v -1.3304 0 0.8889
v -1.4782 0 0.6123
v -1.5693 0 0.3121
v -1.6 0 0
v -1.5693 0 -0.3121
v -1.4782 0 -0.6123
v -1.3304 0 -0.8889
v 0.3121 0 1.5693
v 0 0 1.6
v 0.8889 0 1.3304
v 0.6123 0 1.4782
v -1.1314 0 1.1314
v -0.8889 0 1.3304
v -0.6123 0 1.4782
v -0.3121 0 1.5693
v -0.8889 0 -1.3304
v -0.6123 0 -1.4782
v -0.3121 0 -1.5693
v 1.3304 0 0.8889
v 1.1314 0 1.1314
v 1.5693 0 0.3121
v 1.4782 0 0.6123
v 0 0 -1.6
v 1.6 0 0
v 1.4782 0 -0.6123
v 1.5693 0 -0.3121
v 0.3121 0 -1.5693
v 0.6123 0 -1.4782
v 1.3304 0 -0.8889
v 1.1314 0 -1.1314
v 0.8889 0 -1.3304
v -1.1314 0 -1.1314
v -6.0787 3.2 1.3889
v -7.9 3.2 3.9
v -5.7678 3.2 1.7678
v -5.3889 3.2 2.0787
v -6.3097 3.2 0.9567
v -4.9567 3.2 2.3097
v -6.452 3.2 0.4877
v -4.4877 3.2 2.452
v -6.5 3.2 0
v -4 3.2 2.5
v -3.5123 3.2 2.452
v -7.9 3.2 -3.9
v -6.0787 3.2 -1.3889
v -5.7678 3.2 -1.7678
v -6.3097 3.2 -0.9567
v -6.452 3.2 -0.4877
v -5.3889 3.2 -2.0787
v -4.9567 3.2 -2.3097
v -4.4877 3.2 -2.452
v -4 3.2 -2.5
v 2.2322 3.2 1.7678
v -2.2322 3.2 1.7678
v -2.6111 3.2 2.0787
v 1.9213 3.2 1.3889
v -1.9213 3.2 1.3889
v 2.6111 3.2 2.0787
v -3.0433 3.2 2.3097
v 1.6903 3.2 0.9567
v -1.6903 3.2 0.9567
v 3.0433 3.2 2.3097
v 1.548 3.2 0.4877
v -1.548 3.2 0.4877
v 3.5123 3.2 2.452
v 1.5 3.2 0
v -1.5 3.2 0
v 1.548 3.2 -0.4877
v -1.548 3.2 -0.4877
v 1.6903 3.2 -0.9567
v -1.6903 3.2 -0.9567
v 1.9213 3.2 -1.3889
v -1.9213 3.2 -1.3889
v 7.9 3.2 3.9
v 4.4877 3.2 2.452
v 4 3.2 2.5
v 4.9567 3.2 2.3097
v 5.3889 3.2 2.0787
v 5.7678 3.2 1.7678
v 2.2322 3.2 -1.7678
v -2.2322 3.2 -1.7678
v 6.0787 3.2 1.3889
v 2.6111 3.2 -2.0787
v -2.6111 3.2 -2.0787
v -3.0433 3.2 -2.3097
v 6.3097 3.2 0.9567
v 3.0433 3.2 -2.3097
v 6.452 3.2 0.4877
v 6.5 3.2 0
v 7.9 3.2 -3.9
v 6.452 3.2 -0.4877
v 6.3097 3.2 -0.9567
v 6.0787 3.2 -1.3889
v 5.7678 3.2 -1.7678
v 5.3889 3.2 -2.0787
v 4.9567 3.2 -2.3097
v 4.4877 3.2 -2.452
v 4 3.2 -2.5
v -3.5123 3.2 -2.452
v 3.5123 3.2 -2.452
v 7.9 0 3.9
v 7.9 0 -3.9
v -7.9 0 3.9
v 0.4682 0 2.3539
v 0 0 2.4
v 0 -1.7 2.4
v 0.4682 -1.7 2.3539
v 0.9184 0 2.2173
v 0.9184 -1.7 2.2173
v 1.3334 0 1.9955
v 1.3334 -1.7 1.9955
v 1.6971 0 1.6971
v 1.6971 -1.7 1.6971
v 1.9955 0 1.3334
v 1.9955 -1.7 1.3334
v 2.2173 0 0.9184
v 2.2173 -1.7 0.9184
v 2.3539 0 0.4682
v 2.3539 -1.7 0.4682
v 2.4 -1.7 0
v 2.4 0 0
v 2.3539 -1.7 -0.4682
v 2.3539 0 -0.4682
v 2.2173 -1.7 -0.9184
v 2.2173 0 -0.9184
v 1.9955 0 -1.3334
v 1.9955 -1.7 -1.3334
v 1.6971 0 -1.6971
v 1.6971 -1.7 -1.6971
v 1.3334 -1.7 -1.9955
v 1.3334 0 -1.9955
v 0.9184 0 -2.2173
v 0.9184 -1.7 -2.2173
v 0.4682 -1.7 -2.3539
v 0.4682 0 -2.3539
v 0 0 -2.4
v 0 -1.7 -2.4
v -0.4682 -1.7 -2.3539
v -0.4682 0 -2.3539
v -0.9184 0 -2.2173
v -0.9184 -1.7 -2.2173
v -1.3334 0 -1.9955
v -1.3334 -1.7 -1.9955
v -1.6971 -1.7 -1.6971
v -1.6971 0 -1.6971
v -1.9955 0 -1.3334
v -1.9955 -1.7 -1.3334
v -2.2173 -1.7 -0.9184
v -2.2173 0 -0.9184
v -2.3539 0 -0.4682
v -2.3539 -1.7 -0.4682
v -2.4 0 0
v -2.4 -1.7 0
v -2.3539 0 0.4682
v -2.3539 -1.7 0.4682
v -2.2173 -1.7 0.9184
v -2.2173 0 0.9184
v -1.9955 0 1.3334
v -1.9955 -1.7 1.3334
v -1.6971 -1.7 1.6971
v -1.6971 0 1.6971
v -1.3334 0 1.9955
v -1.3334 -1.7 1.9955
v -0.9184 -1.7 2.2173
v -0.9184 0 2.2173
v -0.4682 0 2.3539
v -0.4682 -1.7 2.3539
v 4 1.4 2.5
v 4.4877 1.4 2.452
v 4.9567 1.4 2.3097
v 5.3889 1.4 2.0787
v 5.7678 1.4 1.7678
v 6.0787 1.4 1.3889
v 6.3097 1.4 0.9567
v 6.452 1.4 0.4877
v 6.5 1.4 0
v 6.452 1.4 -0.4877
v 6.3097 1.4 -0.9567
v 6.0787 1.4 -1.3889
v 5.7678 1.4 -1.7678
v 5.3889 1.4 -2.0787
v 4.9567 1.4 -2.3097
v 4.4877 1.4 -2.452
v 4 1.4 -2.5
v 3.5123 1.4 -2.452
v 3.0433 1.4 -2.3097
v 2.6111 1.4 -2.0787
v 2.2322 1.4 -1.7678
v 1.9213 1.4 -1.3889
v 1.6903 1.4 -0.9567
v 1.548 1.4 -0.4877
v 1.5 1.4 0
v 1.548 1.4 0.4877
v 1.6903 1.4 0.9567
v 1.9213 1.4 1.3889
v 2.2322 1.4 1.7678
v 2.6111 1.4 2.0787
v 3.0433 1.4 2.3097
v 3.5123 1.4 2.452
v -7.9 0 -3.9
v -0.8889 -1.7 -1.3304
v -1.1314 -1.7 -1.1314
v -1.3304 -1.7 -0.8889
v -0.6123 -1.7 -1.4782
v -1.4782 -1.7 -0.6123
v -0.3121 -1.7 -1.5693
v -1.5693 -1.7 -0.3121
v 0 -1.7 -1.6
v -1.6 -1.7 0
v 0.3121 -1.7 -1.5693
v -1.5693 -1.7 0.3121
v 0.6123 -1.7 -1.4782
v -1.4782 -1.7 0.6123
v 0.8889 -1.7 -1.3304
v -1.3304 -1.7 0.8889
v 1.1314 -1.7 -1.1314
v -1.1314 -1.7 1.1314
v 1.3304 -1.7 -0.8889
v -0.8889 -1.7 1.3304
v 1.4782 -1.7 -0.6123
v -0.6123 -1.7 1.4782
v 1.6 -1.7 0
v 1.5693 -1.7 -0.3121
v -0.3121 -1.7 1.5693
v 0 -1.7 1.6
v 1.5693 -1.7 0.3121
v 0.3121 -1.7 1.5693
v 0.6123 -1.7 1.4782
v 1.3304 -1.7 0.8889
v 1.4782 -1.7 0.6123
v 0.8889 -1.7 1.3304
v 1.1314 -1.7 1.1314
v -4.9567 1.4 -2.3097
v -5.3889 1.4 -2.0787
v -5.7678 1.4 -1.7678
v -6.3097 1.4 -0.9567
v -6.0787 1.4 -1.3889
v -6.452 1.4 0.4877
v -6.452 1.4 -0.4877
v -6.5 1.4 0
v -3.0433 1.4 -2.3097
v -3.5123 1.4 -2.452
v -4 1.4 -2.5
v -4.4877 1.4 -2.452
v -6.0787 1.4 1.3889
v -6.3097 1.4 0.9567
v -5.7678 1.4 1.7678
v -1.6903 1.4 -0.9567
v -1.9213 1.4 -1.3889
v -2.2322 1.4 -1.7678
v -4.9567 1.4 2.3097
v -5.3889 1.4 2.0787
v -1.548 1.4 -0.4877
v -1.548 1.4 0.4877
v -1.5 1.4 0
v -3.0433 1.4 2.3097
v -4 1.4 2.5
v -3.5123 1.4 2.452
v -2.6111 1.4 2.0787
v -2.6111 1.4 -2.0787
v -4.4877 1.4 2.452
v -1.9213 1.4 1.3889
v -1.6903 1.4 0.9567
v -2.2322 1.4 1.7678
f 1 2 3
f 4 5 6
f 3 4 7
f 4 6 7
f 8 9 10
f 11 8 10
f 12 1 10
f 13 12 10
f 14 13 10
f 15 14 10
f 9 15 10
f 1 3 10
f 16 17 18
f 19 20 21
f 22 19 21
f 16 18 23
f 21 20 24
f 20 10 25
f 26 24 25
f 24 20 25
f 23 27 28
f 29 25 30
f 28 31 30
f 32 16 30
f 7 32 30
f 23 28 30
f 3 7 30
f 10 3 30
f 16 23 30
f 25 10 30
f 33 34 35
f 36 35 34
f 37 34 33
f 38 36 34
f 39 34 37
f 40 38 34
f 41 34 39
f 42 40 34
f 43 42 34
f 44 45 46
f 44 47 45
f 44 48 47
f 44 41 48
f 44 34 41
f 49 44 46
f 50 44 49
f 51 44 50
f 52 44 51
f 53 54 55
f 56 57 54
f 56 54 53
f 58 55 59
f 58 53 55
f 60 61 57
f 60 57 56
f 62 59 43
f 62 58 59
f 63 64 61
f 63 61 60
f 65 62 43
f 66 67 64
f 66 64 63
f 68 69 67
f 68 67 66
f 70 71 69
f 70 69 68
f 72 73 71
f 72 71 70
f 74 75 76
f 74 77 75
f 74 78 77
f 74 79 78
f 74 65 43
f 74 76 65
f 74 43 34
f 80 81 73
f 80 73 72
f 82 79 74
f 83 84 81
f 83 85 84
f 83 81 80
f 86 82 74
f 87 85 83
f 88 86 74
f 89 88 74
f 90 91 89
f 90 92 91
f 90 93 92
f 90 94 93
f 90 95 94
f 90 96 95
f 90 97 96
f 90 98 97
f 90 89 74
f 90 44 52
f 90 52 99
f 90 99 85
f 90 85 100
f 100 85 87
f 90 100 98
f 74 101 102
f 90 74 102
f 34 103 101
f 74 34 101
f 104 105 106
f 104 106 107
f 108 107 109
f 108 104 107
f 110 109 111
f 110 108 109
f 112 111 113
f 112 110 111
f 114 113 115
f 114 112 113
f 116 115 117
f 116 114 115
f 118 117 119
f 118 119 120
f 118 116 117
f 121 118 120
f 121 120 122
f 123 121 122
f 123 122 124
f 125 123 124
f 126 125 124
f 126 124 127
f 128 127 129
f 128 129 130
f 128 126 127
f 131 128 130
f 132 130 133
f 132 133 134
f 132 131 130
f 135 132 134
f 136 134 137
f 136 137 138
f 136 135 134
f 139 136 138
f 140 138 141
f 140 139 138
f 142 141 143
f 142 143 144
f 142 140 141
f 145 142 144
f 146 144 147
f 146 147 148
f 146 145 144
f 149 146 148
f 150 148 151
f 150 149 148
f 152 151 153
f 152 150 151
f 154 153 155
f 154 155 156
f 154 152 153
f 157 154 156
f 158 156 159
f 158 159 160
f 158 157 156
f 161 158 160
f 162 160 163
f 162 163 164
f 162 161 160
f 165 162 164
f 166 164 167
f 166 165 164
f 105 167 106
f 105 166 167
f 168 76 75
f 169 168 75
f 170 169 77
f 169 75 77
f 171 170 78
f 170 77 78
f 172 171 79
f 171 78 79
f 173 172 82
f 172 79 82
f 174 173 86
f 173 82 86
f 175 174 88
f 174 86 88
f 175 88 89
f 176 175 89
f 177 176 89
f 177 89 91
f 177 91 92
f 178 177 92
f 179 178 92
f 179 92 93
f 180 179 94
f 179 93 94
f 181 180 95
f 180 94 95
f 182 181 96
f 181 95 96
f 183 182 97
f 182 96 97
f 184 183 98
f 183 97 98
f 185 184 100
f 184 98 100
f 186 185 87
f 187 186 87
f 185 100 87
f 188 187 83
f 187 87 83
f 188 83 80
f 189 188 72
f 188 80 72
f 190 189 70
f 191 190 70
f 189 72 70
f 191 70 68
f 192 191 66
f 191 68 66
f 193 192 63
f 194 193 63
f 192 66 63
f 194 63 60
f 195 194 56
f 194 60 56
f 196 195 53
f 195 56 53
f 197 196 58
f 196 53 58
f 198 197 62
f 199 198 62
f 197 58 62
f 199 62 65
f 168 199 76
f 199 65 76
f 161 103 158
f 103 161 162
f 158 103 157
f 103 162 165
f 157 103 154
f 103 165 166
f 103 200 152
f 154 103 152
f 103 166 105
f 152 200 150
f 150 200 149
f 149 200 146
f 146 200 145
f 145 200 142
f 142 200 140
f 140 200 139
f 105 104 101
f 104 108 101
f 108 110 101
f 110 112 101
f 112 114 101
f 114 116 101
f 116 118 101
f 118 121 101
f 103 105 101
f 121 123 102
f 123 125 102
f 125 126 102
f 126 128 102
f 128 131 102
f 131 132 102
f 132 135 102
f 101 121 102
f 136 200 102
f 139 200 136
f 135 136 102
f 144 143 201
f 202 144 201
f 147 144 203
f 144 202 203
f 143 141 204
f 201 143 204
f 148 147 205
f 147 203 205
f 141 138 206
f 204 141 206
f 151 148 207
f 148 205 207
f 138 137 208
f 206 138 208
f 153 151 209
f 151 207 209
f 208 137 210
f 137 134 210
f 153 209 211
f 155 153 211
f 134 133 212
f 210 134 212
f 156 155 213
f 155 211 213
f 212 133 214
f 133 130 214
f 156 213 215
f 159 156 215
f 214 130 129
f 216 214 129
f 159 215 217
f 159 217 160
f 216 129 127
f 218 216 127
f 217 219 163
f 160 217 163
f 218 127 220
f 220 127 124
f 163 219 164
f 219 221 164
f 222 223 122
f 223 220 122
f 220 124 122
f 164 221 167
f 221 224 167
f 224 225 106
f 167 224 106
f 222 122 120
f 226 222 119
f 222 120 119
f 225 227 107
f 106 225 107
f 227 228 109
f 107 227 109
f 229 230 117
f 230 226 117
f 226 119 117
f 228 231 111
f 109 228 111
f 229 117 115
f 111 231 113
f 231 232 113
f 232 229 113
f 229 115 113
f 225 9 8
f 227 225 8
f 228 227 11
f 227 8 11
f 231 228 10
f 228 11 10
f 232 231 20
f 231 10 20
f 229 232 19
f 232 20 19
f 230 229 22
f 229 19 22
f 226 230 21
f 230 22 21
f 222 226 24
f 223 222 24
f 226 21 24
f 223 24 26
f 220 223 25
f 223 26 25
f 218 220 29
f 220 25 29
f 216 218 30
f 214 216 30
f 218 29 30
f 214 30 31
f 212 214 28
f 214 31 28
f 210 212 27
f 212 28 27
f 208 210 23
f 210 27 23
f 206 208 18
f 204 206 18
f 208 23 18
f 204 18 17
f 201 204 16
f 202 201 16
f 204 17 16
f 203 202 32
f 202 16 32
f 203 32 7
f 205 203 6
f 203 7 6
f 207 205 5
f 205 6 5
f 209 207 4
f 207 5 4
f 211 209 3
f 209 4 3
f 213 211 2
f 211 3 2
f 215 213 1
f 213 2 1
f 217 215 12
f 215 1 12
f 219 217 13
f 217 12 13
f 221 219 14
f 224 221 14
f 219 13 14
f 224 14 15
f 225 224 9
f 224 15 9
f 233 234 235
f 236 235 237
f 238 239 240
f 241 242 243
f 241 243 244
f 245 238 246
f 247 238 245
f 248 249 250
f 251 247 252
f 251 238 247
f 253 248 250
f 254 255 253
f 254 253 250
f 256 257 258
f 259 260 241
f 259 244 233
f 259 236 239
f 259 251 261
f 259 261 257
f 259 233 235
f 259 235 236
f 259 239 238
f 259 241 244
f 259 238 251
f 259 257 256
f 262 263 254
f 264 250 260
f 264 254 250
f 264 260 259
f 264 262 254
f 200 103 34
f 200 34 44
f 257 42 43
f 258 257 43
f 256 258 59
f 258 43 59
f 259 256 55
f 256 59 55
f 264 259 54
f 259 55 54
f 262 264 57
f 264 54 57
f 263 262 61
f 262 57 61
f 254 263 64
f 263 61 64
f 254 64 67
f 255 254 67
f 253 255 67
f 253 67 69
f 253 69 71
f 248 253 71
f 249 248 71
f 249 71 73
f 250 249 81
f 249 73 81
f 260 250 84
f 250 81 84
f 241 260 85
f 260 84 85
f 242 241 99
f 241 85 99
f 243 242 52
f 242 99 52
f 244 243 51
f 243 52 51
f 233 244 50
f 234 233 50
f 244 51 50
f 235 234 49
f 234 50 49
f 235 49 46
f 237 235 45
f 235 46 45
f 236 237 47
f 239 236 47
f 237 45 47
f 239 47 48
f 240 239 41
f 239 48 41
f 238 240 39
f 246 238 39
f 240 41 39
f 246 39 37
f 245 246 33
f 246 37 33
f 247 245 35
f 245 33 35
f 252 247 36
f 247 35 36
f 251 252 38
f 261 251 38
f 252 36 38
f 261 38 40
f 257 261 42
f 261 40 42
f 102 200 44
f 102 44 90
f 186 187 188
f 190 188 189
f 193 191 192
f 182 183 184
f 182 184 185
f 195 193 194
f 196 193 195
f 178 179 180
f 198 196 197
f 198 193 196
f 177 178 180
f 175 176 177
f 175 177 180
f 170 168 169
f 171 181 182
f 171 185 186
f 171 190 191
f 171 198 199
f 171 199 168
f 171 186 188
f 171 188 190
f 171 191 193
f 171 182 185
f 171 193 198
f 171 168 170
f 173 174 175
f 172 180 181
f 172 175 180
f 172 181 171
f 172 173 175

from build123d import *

# Parameters (mm, degrees)
SKETCH_1_W          = 15.8
SKETCH_1_H          = 7.8
SKETCH_1_R          = 2.4
EXTRUDE_1_DEPTH     = 3.2
SKETCH_2_R          = 2.4
SKETCH_2_R_2        = 1.6
EXTRUDE_2_DEPTH     = 1.7
SKETCH_3_R          = 2.5
CUT_EXTRUDE_2_DEPTH = 1.8


with BuildPart() as part:
    # Эскиз1 → Бобышка-Вытянуть1 (new body)
    # profile 1 of 2: a face of its own
    with BuildSketch(Plane(origin=(0, 0, 0), x_dir=(1, 0, 0), z_dir=(0, 1, 0))):
        Rectangle(SKETCH_1_W, SKETCH_1_H)
        Circle(SKETCH_1_R, mode=Mode.SUBTRACT)
    # profile 2 of 2: a face of its own
    with BuildSketch(Plane(origin=(0, 0, 0), x_dir=(1, 0, 0), z_dir=(0, 1, 0))):
        Circle(SKETCH_1_R)
    extrude(amount=EXTRUDE_1_DEPTH)

    # Эскиз2 → Бобышка-Вытянуть2 (add)
    with BuildSketch(Plane(origin=(0, 0, 0), x_dir=(1, 0, 0), z_dir=(0, 1, 0))):
        with Locations(Location((0, 0, 0), (0, 0, 270))):
            Circle(SKETCH_2_R)
        with Locations(Location((0, 0, 0), (0, 0, 270))):
            Circle(SKETCH_2_R_2, mode=Mode.SUBTRACT)
    extrude(amount=-EXTRUDE_2_DEPTH)

    # Эскиз3 → Вырез-Вытянуть2 (cut)
    with BuildSketch(Plane(origin=(0, 3.2, 0), x_dir=(1, 0, 0), z_dir=(0, 1, 0))):
        with Locations(Location((-4, 0, 0), (0, 0, 270))):
            Circle(SKETCH_3_R)
        with Locations(Location((4, 0, 0), (0, 0, 270))):
            Circle(SKETCH_3_R)
    extrude(amount=-CUT_EXTRUDE_2_DEPTH, mode=Mode.SUBTRACT)


solid = part.part
